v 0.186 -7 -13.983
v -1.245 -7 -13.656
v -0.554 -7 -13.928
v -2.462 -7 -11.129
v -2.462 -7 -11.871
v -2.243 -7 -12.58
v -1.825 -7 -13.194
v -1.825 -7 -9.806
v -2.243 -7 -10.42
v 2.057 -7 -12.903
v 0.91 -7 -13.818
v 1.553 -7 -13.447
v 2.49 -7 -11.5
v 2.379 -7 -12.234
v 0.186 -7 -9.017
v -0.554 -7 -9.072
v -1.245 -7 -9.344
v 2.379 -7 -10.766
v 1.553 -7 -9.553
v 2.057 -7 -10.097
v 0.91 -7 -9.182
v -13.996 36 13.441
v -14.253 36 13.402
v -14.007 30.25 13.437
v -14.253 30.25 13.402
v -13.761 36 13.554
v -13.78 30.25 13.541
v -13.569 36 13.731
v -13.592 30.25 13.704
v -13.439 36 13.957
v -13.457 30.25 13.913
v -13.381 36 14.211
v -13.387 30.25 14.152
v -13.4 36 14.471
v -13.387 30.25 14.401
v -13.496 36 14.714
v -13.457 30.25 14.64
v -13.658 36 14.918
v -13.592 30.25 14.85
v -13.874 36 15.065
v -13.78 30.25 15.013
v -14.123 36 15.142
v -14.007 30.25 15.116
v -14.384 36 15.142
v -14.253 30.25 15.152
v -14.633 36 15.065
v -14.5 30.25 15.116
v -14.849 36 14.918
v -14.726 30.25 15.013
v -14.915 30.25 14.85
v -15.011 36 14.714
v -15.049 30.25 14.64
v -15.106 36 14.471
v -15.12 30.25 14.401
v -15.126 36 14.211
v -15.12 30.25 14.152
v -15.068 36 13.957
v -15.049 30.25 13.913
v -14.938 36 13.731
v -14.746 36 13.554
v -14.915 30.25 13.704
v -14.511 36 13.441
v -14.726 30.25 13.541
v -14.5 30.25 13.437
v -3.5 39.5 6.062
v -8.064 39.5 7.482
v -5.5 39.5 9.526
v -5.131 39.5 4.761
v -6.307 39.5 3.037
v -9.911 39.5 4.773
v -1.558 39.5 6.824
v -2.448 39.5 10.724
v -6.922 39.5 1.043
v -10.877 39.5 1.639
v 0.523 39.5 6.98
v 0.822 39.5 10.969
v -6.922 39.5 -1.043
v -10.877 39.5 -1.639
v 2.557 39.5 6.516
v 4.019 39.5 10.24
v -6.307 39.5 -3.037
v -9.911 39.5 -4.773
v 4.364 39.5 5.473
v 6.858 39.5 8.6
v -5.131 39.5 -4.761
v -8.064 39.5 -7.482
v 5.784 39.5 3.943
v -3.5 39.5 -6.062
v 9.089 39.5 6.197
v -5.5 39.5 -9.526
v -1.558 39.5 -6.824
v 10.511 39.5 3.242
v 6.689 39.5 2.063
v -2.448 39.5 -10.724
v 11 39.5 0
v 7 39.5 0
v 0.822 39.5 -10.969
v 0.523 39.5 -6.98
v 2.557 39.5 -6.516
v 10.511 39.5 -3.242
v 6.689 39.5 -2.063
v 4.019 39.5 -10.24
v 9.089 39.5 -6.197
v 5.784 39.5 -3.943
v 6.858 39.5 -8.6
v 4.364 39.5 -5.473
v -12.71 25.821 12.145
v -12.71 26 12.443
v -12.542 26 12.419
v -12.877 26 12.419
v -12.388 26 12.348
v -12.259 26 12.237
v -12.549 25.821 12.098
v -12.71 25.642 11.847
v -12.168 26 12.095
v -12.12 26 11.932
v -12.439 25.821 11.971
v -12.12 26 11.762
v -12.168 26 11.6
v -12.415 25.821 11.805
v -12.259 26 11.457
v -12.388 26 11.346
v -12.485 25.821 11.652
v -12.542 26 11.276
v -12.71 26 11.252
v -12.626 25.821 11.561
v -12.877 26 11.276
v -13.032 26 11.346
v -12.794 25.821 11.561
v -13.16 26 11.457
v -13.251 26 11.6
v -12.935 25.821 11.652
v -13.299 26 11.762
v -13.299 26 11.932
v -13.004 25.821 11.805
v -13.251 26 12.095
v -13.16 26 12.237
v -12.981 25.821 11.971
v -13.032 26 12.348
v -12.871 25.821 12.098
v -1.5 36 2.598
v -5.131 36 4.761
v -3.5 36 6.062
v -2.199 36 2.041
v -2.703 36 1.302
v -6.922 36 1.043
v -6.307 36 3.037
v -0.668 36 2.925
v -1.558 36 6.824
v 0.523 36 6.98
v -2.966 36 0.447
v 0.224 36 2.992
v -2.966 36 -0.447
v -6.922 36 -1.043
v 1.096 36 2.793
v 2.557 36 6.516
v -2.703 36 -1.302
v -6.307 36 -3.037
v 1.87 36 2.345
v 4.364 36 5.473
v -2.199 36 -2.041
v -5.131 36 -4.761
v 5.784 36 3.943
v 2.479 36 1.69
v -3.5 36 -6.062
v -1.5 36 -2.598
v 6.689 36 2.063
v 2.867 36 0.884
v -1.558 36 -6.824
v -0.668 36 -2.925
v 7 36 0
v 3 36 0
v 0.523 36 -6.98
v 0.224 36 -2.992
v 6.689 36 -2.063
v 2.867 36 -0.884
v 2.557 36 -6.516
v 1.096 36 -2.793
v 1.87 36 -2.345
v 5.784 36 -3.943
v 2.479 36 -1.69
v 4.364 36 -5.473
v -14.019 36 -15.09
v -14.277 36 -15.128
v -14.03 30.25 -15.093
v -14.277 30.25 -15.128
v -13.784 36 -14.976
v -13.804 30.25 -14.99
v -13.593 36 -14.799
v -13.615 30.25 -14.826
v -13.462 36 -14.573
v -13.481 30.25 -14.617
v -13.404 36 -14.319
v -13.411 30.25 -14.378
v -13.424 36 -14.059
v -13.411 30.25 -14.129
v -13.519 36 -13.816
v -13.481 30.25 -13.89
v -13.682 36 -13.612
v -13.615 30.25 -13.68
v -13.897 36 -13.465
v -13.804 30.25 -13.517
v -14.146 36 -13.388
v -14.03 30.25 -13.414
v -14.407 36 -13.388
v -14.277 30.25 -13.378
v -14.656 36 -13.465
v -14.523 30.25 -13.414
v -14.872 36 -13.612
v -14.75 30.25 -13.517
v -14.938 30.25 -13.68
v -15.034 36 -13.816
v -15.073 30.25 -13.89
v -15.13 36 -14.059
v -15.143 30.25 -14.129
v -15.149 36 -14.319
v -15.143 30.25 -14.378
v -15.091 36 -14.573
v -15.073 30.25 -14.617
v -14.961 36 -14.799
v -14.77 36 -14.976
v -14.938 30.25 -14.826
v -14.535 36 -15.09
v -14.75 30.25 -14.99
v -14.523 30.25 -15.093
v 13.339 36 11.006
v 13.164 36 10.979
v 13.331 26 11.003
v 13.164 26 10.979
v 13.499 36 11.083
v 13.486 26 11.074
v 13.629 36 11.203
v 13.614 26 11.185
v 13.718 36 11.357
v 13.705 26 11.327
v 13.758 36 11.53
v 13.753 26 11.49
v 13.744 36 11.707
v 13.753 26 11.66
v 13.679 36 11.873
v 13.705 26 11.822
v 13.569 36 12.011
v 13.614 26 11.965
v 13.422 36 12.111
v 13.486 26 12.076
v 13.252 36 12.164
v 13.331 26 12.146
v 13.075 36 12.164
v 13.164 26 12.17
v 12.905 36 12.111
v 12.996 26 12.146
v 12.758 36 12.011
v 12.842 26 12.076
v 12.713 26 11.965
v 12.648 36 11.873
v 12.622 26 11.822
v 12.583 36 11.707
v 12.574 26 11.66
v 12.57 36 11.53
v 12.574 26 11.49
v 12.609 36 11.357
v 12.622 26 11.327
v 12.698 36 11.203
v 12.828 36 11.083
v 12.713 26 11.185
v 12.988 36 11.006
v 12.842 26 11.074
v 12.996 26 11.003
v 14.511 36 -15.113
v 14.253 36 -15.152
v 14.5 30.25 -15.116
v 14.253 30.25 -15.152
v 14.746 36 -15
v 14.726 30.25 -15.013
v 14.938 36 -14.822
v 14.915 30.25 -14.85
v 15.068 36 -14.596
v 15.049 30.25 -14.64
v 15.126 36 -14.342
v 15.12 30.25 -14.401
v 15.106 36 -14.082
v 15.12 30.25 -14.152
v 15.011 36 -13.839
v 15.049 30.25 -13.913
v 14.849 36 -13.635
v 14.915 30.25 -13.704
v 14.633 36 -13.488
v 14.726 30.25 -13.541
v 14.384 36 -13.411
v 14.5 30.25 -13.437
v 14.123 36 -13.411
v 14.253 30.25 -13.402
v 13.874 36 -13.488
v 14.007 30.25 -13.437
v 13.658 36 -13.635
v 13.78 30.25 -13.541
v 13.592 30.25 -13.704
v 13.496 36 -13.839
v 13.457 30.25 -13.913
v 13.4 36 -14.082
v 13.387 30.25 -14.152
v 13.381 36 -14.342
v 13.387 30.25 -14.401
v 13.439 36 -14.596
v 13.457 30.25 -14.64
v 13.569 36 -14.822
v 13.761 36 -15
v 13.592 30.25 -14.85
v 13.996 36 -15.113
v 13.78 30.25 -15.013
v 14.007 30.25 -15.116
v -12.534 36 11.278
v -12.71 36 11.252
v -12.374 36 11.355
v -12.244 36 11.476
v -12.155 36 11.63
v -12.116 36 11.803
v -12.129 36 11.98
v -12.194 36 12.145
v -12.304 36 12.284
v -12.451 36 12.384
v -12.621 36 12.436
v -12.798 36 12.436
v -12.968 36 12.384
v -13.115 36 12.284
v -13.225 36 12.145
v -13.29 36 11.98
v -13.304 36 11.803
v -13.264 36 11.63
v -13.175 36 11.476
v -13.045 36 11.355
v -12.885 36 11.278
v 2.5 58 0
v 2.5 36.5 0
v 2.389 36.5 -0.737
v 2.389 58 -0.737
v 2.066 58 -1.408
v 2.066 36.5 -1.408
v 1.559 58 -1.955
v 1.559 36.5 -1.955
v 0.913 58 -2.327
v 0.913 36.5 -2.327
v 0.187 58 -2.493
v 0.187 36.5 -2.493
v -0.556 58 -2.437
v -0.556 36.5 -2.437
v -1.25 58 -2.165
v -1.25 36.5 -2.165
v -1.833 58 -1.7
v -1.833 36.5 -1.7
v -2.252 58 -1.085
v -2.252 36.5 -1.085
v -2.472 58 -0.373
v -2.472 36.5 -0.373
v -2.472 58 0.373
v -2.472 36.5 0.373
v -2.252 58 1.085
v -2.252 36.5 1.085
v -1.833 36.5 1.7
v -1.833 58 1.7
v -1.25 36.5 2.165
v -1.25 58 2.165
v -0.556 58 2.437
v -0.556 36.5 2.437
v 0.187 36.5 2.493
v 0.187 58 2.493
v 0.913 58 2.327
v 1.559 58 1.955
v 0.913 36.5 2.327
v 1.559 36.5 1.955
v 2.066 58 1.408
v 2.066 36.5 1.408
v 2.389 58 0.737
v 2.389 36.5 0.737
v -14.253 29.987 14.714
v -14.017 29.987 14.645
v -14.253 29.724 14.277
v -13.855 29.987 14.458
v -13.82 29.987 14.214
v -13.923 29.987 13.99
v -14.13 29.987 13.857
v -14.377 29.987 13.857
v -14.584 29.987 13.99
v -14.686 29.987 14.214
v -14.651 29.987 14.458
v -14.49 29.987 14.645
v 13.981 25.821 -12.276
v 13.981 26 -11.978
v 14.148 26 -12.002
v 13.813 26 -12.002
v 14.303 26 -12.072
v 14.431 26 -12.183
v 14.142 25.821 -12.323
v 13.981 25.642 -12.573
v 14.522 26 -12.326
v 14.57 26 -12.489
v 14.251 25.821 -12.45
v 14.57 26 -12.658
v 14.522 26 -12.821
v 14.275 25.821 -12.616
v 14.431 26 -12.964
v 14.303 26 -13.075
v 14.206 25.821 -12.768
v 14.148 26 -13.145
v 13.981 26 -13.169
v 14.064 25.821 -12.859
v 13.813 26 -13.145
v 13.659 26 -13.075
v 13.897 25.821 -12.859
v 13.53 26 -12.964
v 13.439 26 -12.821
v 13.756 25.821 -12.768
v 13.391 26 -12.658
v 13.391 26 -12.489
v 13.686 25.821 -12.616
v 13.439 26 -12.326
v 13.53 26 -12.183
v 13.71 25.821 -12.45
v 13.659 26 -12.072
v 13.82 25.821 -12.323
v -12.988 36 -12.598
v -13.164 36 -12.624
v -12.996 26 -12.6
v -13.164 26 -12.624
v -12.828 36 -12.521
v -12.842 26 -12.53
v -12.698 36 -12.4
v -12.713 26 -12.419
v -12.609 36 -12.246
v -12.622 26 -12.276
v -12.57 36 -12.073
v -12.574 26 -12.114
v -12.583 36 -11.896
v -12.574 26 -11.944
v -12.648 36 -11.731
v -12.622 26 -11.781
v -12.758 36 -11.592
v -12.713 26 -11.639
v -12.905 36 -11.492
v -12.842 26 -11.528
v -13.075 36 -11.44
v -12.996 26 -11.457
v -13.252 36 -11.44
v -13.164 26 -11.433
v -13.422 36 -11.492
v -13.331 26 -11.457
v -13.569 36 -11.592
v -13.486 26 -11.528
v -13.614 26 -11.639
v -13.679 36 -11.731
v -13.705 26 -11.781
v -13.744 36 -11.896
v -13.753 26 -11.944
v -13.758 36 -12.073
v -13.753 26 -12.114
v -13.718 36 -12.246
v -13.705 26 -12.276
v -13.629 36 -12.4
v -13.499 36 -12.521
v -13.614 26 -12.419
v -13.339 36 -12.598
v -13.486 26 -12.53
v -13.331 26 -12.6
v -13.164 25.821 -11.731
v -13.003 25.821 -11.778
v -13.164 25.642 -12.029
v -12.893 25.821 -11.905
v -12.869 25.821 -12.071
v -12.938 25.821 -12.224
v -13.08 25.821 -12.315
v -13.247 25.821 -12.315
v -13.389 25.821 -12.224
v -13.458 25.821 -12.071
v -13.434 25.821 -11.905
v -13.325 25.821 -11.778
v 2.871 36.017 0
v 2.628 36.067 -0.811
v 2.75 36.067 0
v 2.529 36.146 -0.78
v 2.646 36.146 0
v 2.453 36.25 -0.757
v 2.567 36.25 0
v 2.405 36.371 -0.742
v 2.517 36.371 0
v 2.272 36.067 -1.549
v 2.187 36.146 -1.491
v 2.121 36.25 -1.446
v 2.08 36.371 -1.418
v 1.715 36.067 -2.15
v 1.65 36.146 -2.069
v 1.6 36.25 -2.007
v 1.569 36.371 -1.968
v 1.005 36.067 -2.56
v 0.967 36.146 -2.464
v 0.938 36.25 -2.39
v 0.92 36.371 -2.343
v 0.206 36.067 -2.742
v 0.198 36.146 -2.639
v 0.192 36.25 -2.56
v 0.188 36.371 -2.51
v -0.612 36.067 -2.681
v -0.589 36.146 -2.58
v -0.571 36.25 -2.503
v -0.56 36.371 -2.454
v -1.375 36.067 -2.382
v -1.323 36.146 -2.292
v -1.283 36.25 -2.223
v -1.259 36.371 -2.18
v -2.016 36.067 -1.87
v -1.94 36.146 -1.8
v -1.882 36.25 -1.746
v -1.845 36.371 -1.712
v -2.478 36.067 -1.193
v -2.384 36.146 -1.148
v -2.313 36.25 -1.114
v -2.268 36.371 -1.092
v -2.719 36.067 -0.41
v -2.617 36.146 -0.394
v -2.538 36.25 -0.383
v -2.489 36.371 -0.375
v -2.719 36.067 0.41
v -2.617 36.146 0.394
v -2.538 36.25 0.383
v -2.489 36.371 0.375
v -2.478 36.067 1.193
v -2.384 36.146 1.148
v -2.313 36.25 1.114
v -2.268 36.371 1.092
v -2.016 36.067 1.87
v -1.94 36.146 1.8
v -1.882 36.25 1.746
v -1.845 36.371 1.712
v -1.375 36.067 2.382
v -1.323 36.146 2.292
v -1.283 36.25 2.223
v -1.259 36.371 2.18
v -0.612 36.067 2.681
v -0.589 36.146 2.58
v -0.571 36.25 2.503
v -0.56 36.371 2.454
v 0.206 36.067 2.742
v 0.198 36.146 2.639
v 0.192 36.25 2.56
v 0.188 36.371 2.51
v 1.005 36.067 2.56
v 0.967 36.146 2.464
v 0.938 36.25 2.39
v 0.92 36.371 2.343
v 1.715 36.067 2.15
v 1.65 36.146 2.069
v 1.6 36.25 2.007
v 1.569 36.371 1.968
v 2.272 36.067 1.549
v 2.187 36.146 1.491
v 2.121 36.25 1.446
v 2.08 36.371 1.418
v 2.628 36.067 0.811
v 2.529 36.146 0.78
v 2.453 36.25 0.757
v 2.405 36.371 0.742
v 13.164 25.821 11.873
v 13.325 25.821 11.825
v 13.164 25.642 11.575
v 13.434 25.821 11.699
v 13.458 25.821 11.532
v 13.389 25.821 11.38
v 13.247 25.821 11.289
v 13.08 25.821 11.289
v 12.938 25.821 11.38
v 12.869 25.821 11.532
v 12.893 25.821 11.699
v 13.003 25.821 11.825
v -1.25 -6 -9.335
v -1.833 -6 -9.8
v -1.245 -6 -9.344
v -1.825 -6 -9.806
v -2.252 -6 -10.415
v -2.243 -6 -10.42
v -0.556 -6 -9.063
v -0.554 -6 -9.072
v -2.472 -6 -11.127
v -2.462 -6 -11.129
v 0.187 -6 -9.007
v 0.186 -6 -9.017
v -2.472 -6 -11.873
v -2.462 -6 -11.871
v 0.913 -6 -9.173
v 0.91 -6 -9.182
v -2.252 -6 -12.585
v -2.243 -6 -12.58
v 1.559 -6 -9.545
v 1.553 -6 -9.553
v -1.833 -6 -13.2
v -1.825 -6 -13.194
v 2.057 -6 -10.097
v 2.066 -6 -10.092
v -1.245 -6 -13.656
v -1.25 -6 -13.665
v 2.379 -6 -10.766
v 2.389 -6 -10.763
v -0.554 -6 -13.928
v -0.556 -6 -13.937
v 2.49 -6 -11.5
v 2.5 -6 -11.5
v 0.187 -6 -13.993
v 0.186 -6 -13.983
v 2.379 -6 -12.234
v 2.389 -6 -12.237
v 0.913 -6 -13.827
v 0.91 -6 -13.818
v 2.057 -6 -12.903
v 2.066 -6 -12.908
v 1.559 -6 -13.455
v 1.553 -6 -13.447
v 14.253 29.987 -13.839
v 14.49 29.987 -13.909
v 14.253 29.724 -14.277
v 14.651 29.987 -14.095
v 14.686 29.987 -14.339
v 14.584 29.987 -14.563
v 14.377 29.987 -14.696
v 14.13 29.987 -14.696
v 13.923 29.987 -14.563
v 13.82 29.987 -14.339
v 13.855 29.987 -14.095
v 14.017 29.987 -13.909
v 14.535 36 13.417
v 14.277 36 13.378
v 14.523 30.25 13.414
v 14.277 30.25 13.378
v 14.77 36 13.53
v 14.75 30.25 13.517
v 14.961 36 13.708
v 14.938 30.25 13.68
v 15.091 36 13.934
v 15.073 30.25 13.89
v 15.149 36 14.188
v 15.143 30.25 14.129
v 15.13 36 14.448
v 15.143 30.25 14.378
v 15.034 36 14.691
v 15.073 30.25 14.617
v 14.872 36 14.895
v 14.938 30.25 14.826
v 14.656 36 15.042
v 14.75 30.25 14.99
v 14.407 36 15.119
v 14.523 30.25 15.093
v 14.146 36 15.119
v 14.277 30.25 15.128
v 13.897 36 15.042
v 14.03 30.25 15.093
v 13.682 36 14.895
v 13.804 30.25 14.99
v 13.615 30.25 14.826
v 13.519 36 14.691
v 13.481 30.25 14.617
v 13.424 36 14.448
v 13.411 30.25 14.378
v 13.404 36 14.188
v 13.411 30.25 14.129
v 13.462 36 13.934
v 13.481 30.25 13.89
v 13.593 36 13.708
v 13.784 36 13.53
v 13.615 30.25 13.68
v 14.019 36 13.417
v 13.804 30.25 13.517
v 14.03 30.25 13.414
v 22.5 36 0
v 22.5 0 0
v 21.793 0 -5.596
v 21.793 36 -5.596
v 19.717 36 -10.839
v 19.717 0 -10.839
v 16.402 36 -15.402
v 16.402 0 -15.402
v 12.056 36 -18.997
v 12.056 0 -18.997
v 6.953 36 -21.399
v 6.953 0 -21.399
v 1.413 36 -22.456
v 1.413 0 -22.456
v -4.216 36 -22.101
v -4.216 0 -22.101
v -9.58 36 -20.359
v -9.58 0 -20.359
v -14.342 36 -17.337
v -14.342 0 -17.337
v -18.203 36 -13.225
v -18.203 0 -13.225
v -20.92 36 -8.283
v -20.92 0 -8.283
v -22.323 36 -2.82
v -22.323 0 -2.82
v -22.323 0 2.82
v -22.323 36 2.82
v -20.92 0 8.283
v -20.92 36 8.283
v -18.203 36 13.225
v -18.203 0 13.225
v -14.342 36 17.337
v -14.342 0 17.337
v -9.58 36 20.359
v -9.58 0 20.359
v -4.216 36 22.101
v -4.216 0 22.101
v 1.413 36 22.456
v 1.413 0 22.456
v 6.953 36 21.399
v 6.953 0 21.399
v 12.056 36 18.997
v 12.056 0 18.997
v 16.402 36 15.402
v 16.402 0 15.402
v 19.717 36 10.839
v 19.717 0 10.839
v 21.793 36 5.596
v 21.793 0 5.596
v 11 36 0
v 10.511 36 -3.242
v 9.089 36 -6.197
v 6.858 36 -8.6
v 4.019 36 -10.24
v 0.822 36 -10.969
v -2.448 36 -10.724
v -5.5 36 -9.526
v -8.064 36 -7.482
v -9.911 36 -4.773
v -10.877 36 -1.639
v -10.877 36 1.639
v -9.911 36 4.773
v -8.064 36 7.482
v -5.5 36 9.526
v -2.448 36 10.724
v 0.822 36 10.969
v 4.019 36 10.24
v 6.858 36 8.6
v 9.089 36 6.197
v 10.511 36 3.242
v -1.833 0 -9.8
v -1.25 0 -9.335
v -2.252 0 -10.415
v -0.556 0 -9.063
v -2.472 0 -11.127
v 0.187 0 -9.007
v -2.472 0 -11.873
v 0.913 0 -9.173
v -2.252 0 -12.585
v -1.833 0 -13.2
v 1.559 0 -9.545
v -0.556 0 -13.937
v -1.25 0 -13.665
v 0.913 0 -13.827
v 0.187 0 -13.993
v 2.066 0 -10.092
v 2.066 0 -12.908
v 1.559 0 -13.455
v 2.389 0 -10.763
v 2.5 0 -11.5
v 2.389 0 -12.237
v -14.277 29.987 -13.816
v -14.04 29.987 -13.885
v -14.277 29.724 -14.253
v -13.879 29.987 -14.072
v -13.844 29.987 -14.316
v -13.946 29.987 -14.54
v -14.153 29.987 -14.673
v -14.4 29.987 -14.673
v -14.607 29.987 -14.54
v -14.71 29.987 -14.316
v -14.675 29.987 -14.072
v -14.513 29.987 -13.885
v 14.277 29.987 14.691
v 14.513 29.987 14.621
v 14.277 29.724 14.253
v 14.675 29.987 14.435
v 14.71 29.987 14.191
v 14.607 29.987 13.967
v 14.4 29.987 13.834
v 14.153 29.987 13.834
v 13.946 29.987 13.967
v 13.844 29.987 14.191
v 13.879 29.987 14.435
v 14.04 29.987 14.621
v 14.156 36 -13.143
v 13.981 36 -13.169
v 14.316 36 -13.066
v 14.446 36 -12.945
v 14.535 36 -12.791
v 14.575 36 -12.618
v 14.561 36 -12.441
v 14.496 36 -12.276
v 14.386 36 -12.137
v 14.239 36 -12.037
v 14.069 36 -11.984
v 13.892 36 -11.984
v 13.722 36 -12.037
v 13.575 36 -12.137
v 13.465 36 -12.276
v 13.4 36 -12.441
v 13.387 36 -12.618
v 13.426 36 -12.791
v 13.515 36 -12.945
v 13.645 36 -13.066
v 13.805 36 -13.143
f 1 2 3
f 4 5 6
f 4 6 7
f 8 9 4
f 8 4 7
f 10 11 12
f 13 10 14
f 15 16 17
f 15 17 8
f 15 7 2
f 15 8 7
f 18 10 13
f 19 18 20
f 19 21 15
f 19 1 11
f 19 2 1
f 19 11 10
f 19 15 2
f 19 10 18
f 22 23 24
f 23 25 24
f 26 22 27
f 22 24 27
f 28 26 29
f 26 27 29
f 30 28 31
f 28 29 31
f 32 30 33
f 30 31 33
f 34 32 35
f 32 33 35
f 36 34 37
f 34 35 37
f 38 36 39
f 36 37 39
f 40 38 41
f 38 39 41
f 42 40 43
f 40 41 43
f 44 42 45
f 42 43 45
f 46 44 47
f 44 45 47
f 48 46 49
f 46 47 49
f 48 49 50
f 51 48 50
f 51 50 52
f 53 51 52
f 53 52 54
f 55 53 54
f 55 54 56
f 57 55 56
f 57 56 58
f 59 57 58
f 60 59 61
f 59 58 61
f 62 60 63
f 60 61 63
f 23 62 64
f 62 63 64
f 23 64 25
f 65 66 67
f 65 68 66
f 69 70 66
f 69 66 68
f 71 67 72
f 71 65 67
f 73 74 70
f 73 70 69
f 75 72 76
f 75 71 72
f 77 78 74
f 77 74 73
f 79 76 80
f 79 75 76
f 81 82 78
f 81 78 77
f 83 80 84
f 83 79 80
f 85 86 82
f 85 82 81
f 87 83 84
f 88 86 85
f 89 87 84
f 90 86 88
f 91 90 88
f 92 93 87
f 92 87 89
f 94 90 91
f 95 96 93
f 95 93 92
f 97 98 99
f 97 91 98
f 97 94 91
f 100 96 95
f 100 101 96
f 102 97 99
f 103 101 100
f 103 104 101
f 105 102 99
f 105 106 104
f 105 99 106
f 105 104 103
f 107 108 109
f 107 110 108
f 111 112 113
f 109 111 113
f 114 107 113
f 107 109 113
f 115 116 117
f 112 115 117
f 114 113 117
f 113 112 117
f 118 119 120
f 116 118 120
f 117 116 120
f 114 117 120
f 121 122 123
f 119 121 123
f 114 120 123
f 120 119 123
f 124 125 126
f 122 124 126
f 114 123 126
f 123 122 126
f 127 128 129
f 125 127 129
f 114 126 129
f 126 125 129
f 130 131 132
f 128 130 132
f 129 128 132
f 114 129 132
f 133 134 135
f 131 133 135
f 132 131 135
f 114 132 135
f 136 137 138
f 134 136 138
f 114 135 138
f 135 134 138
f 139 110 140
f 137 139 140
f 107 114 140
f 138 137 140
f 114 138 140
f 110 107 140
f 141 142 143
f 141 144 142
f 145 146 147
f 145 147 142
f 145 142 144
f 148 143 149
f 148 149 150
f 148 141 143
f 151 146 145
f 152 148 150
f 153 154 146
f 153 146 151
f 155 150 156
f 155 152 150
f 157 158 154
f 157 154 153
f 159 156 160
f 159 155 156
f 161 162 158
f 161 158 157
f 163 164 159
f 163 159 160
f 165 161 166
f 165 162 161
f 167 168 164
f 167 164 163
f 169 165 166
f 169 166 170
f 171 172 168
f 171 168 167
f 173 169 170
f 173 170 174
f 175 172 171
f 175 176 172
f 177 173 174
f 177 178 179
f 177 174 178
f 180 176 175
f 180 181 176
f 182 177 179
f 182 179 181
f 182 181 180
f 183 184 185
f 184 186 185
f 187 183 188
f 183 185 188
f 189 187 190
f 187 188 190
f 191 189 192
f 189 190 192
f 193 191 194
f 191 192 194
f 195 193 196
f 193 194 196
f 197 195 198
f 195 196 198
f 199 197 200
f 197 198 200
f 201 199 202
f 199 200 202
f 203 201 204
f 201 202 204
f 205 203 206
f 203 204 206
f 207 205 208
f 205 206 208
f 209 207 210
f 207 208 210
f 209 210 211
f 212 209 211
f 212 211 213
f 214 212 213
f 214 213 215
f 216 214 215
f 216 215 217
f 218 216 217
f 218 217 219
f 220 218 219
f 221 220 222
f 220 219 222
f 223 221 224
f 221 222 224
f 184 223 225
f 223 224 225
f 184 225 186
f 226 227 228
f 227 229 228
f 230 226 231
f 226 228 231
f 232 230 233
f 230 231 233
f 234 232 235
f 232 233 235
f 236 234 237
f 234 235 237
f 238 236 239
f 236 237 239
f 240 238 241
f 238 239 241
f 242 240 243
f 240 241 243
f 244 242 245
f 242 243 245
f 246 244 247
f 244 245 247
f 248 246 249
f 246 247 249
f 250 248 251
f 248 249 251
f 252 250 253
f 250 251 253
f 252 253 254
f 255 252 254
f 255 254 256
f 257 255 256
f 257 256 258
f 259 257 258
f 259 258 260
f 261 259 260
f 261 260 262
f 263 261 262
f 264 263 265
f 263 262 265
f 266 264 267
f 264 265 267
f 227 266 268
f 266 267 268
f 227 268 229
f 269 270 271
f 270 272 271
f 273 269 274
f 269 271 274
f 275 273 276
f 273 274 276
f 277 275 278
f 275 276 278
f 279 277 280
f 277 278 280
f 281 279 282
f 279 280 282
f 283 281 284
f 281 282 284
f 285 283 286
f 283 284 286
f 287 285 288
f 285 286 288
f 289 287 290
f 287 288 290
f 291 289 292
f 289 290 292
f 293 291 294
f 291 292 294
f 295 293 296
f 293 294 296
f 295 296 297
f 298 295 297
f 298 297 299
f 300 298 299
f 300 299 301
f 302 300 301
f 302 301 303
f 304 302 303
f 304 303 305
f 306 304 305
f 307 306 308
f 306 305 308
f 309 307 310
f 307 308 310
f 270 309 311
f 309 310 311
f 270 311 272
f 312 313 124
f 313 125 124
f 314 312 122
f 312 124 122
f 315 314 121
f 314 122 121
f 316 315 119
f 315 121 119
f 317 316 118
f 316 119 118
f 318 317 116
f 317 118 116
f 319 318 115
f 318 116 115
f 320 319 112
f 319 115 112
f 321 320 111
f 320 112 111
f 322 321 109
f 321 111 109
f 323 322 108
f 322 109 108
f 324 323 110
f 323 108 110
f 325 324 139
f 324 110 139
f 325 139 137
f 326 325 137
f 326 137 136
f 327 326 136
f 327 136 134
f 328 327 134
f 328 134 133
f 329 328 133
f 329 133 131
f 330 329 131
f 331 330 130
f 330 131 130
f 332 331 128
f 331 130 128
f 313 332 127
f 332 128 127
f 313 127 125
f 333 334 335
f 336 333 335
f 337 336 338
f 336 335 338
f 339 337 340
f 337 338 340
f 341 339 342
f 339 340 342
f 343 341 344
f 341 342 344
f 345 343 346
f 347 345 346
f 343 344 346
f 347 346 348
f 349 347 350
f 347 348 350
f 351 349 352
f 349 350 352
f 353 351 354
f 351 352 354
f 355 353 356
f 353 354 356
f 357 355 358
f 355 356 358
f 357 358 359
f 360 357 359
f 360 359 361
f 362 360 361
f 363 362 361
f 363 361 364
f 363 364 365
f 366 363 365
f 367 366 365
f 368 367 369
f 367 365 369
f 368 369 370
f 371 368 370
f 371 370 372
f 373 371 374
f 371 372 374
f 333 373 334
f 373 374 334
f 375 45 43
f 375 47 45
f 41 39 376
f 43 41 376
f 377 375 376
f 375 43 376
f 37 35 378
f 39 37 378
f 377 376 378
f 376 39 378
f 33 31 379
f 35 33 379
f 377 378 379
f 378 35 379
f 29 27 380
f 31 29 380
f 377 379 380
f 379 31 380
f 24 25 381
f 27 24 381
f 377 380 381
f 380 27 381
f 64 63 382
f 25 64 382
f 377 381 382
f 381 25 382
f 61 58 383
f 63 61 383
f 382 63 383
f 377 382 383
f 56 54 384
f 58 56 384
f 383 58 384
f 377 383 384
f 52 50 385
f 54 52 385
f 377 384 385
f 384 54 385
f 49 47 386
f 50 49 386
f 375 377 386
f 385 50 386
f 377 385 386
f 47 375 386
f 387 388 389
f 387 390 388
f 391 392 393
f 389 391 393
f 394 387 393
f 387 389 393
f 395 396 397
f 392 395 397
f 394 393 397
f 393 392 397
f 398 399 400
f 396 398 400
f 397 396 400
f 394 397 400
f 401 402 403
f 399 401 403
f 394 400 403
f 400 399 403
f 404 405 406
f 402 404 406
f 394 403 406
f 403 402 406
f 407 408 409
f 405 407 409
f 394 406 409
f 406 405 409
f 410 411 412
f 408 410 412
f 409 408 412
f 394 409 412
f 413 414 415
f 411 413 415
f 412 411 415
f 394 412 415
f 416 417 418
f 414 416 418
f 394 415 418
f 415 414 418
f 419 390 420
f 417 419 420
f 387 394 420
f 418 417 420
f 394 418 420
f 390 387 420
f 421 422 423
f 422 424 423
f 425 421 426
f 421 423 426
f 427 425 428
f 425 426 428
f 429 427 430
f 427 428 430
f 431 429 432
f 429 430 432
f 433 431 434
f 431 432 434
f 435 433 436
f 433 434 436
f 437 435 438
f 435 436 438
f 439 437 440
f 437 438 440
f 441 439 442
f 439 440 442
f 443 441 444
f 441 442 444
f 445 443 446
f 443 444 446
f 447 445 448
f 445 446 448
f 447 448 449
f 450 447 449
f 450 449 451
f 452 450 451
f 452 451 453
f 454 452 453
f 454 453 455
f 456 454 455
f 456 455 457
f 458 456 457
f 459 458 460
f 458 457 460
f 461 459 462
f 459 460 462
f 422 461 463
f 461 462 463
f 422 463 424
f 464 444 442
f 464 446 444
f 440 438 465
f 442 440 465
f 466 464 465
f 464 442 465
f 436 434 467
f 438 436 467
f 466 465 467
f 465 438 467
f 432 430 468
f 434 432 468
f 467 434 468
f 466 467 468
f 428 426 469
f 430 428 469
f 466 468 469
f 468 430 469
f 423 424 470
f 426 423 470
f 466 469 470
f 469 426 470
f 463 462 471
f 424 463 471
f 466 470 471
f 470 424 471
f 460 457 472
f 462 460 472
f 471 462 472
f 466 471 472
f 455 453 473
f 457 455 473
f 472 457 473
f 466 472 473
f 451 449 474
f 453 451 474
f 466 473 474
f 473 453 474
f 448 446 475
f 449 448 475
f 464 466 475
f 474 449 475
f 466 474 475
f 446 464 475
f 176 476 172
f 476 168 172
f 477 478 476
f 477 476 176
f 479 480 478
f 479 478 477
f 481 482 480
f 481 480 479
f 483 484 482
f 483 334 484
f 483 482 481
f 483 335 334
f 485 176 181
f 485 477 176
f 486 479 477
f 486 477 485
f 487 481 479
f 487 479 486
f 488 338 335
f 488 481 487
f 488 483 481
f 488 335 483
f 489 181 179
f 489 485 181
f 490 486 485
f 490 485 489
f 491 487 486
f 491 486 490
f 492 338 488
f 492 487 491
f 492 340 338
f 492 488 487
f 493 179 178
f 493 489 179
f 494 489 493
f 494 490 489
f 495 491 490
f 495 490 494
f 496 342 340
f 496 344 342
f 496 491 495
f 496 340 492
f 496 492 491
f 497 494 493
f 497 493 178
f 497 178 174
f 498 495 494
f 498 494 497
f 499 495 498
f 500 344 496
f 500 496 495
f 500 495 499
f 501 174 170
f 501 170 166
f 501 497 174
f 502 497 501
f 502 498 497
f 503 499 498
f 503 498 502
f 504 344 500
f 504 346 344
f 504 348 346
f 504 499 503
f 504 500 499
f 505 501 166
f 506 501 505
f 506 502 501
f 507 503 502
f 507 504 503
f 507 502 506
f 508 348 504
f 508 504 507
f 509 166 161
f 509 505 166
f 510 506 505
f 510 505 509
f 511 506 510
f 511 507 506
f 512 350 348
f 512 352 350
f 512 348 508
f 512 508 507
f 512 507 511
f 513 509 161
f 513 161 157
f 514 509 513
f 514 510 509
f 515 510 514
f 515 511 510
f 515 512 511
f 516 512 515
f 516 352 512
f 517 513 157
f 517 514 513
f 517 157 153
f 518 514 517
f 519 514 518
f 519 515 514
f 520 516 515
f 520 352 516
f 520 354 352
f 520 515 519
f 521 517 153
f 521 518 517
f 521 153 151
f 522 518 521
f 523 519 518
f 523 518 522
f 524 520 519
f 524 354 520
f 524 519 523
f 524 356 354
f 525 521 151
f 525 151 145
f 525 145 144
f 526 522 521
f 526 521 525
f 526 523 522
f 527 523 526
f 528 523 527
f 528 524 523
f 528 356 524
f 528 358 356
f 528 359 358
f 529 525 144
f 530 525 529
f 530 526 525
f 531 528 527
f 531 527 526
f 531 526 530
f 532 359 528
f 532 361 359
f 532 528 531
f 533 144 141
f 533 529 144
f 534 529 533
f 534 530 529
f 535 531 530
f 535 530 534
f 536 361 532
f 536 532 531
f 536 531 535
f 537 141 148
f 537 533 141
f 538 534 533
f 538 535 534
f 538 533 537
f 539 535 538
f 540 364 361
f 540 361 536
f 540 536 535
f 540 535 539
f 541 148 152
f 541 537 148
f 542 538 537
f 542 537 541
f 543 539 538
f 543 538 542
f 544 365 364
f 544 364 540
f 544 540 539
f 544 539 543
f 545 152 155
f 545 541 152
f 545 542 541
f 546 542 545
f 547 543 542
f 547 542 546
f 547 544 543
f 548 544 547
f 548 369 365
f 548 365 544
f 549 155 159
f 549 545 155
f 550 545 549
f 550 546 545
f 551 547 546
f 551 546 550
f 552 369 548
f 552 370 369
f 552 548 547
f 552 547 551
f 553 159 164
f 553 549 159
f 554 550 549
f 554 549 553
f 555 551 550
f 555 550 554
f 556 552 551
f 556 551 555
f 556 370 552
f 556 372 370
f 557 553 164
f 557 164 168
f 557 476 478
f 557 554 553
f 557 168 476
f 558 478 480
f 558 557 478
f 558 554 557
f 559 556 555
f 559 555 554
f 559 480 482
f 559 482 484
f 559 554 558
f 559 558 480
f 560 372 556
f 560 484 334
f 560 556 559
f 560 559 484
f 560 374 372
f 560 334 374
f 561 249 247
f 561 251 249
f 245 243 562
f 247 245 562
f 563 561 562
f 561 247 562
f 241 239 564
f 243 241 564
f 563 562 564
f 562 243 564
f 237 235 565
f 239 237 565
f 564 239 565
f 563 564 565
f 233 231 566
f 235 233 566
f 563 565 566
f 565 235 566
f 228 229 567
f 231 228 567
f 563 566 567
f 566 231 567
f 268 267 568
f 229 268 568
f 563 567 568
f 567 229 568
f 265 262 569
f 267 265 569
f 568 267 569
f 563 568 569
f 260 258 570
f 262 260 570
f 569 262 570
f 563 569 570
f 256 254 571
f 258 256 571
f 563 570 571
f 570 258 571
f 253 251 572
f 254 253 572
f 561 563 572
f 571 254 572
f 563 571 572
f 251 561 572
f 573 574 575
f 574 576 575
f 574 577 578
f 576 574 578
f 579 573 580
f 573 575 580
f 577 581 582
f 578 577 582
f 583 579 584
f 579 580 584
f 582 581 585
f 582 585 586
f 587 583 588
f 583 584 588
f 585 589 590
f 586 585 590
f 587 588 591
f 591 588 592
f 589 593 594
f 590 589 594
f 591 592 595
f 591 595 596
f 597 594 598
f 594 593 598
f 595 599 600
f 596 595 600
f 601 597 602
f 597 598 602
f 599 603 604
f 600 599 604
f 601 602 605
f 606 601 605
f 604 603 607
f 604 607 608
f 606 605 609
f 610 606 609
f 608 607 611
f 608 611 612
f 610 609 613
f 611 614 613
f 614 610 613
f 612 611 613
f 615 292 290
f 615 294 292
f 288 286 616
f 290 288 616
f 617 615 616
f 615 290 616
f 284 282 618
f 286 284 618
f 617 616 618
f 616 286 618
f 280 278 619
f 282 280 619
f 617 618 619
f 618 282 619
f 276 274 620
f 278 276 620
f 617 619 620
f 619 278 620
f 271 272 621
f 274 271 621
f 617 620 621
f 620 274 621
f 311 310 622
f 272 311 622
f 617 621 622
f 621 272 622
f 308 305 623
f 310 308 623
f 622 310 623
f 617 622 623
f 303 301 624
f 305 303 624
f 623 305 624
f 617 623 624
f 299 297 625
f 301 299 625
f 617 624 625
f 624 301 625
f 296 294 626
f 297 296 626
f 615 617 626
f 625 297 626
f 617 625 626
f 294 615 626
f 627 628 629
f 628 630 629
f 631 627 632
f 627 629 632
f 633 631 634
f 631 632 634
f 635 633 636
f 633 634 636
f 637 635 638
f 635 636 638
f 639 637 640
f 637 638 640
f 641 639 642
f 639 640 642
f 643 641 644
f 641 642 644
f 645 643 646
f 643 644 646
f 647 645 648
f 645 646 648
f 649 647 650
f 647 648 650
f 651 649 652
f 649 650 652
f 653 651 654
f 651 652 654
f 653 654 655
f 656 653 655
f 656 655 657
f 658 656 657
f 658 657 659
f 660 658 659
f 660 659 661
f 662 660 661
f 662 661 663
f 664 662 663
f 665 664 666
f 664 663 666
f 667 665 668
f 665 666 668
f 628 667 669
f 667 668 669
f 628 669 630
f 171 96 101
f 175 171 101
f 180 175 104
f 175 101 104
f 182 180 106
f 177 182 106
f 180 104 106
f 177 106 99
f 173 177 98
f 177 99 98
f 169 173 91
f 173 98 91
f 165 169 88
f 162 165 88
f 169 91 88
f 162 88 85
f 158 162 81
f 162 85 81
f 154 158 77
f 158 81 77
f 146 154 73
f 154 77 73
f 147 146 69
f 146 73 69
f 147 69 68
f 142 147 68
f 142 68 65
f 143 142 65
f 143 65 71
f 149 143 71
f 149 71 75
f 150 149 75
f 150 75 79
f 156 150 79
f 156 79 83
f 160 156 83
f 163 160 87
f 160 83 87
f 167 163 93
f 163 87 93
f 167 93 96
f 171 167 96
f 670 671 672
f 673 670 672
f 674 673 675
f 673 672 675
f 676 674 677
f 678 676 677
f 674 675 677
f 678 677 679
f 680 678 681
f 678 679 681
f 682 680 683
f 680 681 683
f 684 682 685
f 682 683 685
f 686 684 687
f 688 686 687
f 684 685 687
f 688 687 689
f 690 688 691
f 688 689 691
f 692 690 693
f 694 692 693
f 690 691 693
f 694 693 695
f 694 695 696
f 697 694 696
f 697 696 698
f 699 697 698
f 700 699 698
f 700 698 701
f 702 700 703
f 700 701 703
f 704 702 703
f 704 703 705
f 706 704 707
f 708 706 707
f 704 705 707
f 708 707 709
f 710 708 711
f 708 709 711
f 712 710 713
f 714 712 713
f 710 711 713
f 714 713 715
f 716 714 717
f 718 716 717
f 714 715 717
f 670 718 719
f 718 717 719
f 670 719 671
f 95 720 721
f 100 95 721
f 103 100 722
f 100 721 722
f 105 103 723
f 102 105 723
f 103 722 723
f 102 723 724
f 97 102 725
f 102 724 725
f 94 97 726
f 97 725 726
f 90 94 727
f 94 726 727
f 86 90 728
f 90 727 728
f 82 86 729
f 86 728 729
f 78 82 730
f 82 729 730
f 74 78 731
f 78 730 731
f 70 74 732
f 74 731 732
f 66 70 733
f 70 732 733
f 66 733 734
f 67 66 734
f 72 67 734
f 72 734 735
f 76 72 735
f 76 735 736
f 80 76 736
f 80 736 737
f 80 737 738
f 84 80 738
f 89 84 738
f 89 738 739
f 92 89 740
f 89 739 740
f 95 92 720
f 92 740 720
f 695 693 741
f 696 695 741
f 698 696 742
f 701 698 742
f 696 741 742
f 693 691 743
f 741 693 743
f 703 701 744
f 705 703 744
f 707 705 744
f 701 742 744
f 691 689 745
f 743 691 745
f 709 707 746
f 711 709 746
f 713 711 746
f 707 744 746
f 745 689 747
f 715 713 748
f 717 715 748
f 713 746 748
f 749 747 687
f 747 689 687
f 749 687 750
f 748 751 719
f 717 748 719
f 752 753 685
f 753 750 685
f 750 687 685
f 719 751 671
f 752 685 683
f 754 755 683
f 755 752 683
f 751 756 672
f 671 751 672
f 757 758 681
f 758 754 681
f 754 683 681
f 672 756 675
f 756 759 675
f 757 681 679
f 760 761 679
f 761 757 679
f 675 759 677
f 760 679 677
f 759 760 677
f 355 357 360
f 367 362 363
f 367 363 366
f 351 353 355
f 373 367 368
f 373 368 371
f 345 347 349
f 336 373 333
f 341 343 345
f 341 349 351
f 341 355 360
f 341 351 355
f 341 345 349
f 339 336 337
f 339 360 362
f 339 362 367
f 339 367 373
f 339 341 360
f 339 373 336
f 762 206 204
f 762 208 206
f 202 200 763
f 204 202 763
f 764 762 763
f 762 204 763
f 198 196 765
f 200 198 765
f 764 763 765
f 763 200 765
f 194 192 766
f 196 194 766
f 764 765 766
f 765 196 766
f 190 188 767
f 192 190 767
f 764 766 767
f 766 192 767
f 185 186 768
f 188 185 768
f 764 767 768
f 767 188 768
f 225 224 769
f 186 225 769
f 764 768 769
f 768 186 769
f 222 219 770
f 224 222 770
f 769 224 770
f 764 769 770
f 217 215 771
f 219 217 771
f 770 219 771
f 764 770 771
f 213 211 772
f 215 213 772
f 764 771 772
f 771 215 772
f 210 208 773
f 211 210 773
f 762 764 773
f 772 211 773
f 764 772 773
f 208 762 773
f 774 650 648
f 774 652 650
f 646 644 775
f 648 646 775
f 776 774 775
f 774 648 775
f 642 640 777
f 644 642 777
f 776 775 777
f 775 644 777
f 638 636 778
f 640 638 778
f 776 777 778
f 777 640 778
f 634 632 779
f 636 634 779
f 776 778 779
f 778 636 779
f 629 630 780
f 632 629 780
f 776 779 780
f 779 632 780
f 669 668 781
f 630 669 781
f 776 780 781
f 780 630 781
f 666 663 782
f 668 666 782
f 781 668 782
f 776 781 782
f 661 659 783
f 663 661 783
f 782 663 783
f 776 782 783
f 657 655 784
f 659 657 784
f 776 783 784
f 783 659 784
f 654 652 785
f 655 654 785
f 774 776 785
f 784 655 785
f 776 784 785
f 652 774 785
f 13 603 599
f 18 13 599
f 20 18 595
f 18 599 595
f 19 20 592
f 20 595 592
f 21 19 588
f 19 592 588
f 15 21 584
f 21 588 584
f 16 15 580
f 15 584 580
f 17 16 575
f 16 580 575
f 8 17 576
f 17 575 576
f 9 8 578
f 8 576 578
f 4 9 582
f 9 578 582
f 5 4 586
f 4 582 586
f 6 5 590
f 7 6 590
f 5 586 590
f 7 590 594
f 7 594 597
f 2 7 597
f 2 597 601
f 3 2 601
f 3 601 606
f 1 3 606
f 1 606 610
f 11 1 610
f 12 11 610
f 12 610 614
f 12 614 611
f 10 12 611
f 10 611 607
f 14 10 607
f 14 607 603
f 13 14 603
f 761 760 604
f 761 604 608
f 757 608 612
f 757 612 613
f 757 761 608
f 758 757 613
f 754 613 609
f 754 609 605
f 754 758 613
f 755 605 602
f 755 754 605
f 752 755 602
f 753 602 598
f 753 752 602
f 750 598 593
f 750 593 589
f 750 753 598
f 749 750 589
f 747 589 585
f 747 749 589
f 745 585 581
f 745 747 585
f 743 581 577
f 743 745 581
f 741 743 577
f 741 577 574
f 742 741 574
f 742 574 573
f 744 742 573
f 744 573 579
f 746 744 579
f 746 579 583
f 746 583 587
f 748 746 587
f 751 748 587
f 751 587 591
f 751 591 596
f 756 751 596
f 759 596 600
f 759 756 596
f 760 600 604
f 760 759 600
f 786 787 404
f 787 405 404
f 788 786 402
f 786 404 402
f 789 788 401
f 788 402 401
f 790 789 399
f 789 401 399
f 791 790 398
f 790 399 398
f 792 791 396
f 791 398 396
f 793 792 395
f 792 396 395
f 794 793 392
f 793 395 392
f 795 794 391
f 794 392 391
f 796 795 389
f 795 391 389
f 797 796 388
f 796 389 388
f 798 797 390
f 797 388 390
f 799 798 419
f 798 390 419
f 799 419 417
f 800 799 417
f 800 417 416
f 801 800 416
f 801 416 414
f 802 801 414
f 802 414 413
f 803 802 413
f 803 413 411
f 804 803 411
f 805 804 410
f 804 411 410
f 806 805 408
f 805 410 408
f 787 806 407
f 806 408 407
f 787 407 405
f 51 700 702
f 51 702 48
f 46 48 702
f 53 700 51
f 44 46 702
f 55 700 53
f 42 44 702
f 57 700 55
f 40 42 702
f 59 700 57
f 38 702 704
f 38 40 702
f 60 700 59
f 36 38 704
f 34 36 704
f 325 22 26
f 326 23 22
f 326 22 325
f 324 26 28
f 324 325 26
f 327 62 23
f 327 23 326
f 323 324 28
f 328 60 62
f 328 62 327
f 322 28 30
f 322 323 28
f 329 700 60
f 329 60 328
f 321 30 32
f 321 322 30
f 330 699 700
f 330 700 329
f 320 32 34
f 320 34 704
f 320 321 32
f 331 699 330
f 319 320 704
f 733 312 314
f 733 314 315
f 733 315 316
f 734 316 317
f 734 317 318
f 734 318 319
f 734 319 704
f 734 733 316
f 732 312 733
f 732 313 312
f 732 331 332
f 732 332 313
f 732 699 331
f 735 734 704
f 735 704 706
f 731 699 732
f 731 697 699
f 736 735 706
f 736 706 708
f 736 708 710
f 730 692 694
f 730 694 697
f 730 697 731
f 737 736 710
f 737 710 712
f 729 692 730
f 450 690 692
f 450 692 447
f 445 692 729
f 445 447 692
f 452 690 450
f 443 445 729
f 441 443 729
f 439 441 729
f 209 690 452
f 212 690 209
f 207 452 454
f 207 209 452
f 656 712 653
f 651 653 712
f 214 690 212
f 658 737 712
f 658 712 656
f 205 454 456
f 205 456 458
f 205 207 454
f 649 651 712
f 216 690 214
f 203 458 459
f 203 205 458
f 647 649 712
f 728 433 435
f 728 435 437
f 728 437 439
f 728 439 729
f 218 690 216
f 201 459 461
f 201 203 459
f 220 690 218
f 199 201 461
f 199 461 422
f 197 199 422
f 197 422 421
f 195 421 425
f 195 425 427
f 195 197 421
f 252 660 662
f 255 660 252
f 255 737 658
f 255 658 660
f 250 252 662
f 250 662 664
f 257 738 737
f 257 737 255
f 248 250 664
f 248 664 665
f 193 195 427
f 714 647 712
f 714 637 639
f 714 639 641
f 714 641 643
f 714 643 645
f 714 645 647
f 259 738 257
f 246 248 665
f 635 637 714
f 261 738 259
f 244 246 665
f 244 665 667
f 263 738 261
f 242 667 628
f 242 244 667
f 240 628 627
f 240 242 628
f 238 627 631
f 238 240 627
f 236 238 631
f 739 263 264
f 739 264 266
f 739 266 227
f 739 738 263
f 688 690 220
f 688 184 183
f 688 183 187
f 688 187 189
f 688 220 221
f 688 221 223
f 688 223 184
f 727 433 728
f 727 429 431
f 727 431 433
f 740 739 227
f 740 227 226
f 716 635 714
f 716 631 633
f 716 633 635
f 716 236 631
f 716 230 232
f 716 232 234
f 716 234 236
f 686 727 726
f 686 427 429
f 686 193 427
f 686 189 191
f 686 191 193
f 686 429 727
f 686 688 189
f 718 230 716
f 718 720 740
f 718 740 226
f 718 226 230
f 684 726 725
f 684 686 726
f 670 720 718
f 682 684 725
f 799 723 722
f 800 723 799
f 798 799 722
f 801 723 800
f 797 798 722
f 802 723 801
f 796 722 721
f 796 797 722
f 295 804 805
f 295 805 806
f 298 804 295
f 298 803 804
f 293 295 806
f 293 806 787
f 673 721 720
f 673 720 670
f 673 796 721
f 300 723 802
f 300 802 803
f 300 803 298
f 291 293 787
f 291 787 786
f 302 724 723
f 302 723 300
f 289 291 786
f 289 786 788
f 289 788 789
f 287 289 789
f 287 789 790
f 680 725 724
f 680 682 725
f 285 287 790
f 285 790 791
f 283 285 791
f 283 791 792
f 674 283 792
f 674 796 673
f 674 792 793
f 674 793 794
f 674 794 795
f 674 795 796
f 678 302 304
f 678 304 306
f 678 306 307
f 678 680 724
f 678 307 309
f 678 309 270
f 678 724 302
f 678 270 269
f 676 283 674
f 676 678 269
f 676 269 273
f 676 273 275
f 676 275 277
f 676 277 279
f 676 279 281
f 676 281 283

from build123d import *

# Parameters (mm, degrees)
SKETCH1_R                    = 22.5
BOSS_EXTRUDE1_DEPTH          = 36
SKETCH2_R                    = 11
BOSS_EXTRUDE2_DEPTH          = 3.5
SKETCH5_R                    = 7
CUT_EXTRUDE1_DEPTH           = 3.5
SKETCH6_R                    = 2.5
BOSS_EXTRUDE3_DEPTH          = 22
FILLET1_R                    = 0.5
M2_2X0_45_TAPPED_HOLE1_D     = 1.75
M2_2X0_45_TAPPED_HOLE1_DEPTH = 5.75
M2_2X0_45_TAPPED_HOLE1_TIP   = 0.525753042
SKETCH21_R                   = 2.490055496
BOSS_EXTRUDE6_DEPTH          = 7
F_0_80_TAPPED_HOLE3_D        = 1.19126
F_0_80_TAPPED_HOLE3_DEPTH    = 10
F_0_80_TAPPED_HOLE3_TIP      = 0.357890611
SKETCH17_R                   = 2.5
BOSS_EXTRUDE5_DEPTH          = 6


with BuildPart() as part:
    # Sketch1 → Boss-Extrude1 (new body)
    with BuildSketch(Plane(origin=(0, 0, 0), x_dir=(1, 0, 0), z_dir=(0, 1, 0))):
        Circle(SKETCH1_R)
    extrude(amount=BOSS_EXTRUDE1_DEPTH)

    # Sketch2 → Boss-Extrude2 (add)
    with BuildSketch(Plane(origin=(0, 36, 0), x_dir=(1, 0, 0), z_dir=(0, 1, 0))):
        Circle(SKETCH2_R)
    extrude(amount=BOSS_EXTRUDE2_DEPTH)

    # Sketch5 → Cut-Extrude1 (cut)
    with BuildSketch(Plane(origin=(0, 39.5, 0), x_dir=(1, 0, 0), z_dir=(0, 1, 0))):
        Circle(SKETCH5_R)
    extrude(amount=-CUT_EXTRUDE1_DEPTH, mode=Mode.SUBTRACT)

    # Sketch6 → Boss-Extrude3 (add)
    with BuildSketch(Plane(origin=(0, 36, 0), x_dir=(1, 0, 0), z_dir=(0, 1, 0))):
        Circle(SKETCH6_R)
    extrude(amount=BOSS_EXTRUDE3_DEPTH)

    # Fillet1
    fillet1_edges = [part.edges().sort_by_distance(p)[0] for p in [
        (-2.5, 36, 0),
    ]]
    fillet(fillet1_edges, radius=FILLET1_R)

    # M2.2x0.45 Tapped Hole1
    with Locations(Plane(origin=(-14.276653016, 36, -14.253421631), x_dir=(0, 0, 1), z_dir=(0, 1, 0))):
        with Locations((0, 0), (-0.023231385, 28.530074647), (28.530074647, 0.023231385), (28.506843262, 28.553306032)):
            Hole(M2_2X0_45_TAPPED_HOLE1_D / 2, depth=M2_2X0_45_TAPPED_HOLE1_DEPTH)
            with Locations((0, 0, -(M2_2X0_45_TAPPED_HOLE1_DEPTH + M2_2X0_45_TAPPED_HOLE1_TIP / 2))):  # 118° drill point
                Cone(0, M2_2X0_45_TAPPED_HOLE1_D / 2, M2_2X0_45_TAPPED_HOLE1_TIP, mode=Mode.SUBTRACT)

    # Sketch21 → Boss-Extrude6 (add)
    with BuildSketch(Plane.XZ):
        with Locations((0, -11.5)):
            Circle(SKETCH21_R)
    extrude(amount=BOSS_EXTRUDE6_DEPTH)

    # #0-80 Tapped Hole3
    with Locations(Plane(origin=(-13.163543756, 36, -12.028755501), x_dir=(0, 0, 1), z_dir=(0, 1, 0))):
        with Locations((0, 0), (23.6035957, 26.327087512), (-0.544698362, 27.144135055), (23.875944881, 0.453915302)):
            Hole(F_0_80_TAPPED_HOLE3_D / 2, depth=F_0_80_TAPPED_HOLE3_DEPTH)
            with Locations((0, 0, -(F_0_80_TAPPED_HOLE3_DEPTH + F_0_80_TAPPED_HOLE3_TIP / 2))):  # 118° drill point
                Cone(0, F_0_80_TAPPED_HOLE3_D / 2, F_0_80_TAPPED_HOLE3_TIP, mode=Mode.SUBTRACT)

    # Sketch17 → Boss-Extrude5 (add)
    with BuildSketch(Plane(origin=(0, 0, 0), x_dir=(1, 0, 0), z_dir=(0, 1, 0))):
        with Locations((0, 11.5)):
            Circle(SKETCH17_R)
    extrude(amount=-BOSS_EXTRUDE5_DEPTH)


solid = part.part
